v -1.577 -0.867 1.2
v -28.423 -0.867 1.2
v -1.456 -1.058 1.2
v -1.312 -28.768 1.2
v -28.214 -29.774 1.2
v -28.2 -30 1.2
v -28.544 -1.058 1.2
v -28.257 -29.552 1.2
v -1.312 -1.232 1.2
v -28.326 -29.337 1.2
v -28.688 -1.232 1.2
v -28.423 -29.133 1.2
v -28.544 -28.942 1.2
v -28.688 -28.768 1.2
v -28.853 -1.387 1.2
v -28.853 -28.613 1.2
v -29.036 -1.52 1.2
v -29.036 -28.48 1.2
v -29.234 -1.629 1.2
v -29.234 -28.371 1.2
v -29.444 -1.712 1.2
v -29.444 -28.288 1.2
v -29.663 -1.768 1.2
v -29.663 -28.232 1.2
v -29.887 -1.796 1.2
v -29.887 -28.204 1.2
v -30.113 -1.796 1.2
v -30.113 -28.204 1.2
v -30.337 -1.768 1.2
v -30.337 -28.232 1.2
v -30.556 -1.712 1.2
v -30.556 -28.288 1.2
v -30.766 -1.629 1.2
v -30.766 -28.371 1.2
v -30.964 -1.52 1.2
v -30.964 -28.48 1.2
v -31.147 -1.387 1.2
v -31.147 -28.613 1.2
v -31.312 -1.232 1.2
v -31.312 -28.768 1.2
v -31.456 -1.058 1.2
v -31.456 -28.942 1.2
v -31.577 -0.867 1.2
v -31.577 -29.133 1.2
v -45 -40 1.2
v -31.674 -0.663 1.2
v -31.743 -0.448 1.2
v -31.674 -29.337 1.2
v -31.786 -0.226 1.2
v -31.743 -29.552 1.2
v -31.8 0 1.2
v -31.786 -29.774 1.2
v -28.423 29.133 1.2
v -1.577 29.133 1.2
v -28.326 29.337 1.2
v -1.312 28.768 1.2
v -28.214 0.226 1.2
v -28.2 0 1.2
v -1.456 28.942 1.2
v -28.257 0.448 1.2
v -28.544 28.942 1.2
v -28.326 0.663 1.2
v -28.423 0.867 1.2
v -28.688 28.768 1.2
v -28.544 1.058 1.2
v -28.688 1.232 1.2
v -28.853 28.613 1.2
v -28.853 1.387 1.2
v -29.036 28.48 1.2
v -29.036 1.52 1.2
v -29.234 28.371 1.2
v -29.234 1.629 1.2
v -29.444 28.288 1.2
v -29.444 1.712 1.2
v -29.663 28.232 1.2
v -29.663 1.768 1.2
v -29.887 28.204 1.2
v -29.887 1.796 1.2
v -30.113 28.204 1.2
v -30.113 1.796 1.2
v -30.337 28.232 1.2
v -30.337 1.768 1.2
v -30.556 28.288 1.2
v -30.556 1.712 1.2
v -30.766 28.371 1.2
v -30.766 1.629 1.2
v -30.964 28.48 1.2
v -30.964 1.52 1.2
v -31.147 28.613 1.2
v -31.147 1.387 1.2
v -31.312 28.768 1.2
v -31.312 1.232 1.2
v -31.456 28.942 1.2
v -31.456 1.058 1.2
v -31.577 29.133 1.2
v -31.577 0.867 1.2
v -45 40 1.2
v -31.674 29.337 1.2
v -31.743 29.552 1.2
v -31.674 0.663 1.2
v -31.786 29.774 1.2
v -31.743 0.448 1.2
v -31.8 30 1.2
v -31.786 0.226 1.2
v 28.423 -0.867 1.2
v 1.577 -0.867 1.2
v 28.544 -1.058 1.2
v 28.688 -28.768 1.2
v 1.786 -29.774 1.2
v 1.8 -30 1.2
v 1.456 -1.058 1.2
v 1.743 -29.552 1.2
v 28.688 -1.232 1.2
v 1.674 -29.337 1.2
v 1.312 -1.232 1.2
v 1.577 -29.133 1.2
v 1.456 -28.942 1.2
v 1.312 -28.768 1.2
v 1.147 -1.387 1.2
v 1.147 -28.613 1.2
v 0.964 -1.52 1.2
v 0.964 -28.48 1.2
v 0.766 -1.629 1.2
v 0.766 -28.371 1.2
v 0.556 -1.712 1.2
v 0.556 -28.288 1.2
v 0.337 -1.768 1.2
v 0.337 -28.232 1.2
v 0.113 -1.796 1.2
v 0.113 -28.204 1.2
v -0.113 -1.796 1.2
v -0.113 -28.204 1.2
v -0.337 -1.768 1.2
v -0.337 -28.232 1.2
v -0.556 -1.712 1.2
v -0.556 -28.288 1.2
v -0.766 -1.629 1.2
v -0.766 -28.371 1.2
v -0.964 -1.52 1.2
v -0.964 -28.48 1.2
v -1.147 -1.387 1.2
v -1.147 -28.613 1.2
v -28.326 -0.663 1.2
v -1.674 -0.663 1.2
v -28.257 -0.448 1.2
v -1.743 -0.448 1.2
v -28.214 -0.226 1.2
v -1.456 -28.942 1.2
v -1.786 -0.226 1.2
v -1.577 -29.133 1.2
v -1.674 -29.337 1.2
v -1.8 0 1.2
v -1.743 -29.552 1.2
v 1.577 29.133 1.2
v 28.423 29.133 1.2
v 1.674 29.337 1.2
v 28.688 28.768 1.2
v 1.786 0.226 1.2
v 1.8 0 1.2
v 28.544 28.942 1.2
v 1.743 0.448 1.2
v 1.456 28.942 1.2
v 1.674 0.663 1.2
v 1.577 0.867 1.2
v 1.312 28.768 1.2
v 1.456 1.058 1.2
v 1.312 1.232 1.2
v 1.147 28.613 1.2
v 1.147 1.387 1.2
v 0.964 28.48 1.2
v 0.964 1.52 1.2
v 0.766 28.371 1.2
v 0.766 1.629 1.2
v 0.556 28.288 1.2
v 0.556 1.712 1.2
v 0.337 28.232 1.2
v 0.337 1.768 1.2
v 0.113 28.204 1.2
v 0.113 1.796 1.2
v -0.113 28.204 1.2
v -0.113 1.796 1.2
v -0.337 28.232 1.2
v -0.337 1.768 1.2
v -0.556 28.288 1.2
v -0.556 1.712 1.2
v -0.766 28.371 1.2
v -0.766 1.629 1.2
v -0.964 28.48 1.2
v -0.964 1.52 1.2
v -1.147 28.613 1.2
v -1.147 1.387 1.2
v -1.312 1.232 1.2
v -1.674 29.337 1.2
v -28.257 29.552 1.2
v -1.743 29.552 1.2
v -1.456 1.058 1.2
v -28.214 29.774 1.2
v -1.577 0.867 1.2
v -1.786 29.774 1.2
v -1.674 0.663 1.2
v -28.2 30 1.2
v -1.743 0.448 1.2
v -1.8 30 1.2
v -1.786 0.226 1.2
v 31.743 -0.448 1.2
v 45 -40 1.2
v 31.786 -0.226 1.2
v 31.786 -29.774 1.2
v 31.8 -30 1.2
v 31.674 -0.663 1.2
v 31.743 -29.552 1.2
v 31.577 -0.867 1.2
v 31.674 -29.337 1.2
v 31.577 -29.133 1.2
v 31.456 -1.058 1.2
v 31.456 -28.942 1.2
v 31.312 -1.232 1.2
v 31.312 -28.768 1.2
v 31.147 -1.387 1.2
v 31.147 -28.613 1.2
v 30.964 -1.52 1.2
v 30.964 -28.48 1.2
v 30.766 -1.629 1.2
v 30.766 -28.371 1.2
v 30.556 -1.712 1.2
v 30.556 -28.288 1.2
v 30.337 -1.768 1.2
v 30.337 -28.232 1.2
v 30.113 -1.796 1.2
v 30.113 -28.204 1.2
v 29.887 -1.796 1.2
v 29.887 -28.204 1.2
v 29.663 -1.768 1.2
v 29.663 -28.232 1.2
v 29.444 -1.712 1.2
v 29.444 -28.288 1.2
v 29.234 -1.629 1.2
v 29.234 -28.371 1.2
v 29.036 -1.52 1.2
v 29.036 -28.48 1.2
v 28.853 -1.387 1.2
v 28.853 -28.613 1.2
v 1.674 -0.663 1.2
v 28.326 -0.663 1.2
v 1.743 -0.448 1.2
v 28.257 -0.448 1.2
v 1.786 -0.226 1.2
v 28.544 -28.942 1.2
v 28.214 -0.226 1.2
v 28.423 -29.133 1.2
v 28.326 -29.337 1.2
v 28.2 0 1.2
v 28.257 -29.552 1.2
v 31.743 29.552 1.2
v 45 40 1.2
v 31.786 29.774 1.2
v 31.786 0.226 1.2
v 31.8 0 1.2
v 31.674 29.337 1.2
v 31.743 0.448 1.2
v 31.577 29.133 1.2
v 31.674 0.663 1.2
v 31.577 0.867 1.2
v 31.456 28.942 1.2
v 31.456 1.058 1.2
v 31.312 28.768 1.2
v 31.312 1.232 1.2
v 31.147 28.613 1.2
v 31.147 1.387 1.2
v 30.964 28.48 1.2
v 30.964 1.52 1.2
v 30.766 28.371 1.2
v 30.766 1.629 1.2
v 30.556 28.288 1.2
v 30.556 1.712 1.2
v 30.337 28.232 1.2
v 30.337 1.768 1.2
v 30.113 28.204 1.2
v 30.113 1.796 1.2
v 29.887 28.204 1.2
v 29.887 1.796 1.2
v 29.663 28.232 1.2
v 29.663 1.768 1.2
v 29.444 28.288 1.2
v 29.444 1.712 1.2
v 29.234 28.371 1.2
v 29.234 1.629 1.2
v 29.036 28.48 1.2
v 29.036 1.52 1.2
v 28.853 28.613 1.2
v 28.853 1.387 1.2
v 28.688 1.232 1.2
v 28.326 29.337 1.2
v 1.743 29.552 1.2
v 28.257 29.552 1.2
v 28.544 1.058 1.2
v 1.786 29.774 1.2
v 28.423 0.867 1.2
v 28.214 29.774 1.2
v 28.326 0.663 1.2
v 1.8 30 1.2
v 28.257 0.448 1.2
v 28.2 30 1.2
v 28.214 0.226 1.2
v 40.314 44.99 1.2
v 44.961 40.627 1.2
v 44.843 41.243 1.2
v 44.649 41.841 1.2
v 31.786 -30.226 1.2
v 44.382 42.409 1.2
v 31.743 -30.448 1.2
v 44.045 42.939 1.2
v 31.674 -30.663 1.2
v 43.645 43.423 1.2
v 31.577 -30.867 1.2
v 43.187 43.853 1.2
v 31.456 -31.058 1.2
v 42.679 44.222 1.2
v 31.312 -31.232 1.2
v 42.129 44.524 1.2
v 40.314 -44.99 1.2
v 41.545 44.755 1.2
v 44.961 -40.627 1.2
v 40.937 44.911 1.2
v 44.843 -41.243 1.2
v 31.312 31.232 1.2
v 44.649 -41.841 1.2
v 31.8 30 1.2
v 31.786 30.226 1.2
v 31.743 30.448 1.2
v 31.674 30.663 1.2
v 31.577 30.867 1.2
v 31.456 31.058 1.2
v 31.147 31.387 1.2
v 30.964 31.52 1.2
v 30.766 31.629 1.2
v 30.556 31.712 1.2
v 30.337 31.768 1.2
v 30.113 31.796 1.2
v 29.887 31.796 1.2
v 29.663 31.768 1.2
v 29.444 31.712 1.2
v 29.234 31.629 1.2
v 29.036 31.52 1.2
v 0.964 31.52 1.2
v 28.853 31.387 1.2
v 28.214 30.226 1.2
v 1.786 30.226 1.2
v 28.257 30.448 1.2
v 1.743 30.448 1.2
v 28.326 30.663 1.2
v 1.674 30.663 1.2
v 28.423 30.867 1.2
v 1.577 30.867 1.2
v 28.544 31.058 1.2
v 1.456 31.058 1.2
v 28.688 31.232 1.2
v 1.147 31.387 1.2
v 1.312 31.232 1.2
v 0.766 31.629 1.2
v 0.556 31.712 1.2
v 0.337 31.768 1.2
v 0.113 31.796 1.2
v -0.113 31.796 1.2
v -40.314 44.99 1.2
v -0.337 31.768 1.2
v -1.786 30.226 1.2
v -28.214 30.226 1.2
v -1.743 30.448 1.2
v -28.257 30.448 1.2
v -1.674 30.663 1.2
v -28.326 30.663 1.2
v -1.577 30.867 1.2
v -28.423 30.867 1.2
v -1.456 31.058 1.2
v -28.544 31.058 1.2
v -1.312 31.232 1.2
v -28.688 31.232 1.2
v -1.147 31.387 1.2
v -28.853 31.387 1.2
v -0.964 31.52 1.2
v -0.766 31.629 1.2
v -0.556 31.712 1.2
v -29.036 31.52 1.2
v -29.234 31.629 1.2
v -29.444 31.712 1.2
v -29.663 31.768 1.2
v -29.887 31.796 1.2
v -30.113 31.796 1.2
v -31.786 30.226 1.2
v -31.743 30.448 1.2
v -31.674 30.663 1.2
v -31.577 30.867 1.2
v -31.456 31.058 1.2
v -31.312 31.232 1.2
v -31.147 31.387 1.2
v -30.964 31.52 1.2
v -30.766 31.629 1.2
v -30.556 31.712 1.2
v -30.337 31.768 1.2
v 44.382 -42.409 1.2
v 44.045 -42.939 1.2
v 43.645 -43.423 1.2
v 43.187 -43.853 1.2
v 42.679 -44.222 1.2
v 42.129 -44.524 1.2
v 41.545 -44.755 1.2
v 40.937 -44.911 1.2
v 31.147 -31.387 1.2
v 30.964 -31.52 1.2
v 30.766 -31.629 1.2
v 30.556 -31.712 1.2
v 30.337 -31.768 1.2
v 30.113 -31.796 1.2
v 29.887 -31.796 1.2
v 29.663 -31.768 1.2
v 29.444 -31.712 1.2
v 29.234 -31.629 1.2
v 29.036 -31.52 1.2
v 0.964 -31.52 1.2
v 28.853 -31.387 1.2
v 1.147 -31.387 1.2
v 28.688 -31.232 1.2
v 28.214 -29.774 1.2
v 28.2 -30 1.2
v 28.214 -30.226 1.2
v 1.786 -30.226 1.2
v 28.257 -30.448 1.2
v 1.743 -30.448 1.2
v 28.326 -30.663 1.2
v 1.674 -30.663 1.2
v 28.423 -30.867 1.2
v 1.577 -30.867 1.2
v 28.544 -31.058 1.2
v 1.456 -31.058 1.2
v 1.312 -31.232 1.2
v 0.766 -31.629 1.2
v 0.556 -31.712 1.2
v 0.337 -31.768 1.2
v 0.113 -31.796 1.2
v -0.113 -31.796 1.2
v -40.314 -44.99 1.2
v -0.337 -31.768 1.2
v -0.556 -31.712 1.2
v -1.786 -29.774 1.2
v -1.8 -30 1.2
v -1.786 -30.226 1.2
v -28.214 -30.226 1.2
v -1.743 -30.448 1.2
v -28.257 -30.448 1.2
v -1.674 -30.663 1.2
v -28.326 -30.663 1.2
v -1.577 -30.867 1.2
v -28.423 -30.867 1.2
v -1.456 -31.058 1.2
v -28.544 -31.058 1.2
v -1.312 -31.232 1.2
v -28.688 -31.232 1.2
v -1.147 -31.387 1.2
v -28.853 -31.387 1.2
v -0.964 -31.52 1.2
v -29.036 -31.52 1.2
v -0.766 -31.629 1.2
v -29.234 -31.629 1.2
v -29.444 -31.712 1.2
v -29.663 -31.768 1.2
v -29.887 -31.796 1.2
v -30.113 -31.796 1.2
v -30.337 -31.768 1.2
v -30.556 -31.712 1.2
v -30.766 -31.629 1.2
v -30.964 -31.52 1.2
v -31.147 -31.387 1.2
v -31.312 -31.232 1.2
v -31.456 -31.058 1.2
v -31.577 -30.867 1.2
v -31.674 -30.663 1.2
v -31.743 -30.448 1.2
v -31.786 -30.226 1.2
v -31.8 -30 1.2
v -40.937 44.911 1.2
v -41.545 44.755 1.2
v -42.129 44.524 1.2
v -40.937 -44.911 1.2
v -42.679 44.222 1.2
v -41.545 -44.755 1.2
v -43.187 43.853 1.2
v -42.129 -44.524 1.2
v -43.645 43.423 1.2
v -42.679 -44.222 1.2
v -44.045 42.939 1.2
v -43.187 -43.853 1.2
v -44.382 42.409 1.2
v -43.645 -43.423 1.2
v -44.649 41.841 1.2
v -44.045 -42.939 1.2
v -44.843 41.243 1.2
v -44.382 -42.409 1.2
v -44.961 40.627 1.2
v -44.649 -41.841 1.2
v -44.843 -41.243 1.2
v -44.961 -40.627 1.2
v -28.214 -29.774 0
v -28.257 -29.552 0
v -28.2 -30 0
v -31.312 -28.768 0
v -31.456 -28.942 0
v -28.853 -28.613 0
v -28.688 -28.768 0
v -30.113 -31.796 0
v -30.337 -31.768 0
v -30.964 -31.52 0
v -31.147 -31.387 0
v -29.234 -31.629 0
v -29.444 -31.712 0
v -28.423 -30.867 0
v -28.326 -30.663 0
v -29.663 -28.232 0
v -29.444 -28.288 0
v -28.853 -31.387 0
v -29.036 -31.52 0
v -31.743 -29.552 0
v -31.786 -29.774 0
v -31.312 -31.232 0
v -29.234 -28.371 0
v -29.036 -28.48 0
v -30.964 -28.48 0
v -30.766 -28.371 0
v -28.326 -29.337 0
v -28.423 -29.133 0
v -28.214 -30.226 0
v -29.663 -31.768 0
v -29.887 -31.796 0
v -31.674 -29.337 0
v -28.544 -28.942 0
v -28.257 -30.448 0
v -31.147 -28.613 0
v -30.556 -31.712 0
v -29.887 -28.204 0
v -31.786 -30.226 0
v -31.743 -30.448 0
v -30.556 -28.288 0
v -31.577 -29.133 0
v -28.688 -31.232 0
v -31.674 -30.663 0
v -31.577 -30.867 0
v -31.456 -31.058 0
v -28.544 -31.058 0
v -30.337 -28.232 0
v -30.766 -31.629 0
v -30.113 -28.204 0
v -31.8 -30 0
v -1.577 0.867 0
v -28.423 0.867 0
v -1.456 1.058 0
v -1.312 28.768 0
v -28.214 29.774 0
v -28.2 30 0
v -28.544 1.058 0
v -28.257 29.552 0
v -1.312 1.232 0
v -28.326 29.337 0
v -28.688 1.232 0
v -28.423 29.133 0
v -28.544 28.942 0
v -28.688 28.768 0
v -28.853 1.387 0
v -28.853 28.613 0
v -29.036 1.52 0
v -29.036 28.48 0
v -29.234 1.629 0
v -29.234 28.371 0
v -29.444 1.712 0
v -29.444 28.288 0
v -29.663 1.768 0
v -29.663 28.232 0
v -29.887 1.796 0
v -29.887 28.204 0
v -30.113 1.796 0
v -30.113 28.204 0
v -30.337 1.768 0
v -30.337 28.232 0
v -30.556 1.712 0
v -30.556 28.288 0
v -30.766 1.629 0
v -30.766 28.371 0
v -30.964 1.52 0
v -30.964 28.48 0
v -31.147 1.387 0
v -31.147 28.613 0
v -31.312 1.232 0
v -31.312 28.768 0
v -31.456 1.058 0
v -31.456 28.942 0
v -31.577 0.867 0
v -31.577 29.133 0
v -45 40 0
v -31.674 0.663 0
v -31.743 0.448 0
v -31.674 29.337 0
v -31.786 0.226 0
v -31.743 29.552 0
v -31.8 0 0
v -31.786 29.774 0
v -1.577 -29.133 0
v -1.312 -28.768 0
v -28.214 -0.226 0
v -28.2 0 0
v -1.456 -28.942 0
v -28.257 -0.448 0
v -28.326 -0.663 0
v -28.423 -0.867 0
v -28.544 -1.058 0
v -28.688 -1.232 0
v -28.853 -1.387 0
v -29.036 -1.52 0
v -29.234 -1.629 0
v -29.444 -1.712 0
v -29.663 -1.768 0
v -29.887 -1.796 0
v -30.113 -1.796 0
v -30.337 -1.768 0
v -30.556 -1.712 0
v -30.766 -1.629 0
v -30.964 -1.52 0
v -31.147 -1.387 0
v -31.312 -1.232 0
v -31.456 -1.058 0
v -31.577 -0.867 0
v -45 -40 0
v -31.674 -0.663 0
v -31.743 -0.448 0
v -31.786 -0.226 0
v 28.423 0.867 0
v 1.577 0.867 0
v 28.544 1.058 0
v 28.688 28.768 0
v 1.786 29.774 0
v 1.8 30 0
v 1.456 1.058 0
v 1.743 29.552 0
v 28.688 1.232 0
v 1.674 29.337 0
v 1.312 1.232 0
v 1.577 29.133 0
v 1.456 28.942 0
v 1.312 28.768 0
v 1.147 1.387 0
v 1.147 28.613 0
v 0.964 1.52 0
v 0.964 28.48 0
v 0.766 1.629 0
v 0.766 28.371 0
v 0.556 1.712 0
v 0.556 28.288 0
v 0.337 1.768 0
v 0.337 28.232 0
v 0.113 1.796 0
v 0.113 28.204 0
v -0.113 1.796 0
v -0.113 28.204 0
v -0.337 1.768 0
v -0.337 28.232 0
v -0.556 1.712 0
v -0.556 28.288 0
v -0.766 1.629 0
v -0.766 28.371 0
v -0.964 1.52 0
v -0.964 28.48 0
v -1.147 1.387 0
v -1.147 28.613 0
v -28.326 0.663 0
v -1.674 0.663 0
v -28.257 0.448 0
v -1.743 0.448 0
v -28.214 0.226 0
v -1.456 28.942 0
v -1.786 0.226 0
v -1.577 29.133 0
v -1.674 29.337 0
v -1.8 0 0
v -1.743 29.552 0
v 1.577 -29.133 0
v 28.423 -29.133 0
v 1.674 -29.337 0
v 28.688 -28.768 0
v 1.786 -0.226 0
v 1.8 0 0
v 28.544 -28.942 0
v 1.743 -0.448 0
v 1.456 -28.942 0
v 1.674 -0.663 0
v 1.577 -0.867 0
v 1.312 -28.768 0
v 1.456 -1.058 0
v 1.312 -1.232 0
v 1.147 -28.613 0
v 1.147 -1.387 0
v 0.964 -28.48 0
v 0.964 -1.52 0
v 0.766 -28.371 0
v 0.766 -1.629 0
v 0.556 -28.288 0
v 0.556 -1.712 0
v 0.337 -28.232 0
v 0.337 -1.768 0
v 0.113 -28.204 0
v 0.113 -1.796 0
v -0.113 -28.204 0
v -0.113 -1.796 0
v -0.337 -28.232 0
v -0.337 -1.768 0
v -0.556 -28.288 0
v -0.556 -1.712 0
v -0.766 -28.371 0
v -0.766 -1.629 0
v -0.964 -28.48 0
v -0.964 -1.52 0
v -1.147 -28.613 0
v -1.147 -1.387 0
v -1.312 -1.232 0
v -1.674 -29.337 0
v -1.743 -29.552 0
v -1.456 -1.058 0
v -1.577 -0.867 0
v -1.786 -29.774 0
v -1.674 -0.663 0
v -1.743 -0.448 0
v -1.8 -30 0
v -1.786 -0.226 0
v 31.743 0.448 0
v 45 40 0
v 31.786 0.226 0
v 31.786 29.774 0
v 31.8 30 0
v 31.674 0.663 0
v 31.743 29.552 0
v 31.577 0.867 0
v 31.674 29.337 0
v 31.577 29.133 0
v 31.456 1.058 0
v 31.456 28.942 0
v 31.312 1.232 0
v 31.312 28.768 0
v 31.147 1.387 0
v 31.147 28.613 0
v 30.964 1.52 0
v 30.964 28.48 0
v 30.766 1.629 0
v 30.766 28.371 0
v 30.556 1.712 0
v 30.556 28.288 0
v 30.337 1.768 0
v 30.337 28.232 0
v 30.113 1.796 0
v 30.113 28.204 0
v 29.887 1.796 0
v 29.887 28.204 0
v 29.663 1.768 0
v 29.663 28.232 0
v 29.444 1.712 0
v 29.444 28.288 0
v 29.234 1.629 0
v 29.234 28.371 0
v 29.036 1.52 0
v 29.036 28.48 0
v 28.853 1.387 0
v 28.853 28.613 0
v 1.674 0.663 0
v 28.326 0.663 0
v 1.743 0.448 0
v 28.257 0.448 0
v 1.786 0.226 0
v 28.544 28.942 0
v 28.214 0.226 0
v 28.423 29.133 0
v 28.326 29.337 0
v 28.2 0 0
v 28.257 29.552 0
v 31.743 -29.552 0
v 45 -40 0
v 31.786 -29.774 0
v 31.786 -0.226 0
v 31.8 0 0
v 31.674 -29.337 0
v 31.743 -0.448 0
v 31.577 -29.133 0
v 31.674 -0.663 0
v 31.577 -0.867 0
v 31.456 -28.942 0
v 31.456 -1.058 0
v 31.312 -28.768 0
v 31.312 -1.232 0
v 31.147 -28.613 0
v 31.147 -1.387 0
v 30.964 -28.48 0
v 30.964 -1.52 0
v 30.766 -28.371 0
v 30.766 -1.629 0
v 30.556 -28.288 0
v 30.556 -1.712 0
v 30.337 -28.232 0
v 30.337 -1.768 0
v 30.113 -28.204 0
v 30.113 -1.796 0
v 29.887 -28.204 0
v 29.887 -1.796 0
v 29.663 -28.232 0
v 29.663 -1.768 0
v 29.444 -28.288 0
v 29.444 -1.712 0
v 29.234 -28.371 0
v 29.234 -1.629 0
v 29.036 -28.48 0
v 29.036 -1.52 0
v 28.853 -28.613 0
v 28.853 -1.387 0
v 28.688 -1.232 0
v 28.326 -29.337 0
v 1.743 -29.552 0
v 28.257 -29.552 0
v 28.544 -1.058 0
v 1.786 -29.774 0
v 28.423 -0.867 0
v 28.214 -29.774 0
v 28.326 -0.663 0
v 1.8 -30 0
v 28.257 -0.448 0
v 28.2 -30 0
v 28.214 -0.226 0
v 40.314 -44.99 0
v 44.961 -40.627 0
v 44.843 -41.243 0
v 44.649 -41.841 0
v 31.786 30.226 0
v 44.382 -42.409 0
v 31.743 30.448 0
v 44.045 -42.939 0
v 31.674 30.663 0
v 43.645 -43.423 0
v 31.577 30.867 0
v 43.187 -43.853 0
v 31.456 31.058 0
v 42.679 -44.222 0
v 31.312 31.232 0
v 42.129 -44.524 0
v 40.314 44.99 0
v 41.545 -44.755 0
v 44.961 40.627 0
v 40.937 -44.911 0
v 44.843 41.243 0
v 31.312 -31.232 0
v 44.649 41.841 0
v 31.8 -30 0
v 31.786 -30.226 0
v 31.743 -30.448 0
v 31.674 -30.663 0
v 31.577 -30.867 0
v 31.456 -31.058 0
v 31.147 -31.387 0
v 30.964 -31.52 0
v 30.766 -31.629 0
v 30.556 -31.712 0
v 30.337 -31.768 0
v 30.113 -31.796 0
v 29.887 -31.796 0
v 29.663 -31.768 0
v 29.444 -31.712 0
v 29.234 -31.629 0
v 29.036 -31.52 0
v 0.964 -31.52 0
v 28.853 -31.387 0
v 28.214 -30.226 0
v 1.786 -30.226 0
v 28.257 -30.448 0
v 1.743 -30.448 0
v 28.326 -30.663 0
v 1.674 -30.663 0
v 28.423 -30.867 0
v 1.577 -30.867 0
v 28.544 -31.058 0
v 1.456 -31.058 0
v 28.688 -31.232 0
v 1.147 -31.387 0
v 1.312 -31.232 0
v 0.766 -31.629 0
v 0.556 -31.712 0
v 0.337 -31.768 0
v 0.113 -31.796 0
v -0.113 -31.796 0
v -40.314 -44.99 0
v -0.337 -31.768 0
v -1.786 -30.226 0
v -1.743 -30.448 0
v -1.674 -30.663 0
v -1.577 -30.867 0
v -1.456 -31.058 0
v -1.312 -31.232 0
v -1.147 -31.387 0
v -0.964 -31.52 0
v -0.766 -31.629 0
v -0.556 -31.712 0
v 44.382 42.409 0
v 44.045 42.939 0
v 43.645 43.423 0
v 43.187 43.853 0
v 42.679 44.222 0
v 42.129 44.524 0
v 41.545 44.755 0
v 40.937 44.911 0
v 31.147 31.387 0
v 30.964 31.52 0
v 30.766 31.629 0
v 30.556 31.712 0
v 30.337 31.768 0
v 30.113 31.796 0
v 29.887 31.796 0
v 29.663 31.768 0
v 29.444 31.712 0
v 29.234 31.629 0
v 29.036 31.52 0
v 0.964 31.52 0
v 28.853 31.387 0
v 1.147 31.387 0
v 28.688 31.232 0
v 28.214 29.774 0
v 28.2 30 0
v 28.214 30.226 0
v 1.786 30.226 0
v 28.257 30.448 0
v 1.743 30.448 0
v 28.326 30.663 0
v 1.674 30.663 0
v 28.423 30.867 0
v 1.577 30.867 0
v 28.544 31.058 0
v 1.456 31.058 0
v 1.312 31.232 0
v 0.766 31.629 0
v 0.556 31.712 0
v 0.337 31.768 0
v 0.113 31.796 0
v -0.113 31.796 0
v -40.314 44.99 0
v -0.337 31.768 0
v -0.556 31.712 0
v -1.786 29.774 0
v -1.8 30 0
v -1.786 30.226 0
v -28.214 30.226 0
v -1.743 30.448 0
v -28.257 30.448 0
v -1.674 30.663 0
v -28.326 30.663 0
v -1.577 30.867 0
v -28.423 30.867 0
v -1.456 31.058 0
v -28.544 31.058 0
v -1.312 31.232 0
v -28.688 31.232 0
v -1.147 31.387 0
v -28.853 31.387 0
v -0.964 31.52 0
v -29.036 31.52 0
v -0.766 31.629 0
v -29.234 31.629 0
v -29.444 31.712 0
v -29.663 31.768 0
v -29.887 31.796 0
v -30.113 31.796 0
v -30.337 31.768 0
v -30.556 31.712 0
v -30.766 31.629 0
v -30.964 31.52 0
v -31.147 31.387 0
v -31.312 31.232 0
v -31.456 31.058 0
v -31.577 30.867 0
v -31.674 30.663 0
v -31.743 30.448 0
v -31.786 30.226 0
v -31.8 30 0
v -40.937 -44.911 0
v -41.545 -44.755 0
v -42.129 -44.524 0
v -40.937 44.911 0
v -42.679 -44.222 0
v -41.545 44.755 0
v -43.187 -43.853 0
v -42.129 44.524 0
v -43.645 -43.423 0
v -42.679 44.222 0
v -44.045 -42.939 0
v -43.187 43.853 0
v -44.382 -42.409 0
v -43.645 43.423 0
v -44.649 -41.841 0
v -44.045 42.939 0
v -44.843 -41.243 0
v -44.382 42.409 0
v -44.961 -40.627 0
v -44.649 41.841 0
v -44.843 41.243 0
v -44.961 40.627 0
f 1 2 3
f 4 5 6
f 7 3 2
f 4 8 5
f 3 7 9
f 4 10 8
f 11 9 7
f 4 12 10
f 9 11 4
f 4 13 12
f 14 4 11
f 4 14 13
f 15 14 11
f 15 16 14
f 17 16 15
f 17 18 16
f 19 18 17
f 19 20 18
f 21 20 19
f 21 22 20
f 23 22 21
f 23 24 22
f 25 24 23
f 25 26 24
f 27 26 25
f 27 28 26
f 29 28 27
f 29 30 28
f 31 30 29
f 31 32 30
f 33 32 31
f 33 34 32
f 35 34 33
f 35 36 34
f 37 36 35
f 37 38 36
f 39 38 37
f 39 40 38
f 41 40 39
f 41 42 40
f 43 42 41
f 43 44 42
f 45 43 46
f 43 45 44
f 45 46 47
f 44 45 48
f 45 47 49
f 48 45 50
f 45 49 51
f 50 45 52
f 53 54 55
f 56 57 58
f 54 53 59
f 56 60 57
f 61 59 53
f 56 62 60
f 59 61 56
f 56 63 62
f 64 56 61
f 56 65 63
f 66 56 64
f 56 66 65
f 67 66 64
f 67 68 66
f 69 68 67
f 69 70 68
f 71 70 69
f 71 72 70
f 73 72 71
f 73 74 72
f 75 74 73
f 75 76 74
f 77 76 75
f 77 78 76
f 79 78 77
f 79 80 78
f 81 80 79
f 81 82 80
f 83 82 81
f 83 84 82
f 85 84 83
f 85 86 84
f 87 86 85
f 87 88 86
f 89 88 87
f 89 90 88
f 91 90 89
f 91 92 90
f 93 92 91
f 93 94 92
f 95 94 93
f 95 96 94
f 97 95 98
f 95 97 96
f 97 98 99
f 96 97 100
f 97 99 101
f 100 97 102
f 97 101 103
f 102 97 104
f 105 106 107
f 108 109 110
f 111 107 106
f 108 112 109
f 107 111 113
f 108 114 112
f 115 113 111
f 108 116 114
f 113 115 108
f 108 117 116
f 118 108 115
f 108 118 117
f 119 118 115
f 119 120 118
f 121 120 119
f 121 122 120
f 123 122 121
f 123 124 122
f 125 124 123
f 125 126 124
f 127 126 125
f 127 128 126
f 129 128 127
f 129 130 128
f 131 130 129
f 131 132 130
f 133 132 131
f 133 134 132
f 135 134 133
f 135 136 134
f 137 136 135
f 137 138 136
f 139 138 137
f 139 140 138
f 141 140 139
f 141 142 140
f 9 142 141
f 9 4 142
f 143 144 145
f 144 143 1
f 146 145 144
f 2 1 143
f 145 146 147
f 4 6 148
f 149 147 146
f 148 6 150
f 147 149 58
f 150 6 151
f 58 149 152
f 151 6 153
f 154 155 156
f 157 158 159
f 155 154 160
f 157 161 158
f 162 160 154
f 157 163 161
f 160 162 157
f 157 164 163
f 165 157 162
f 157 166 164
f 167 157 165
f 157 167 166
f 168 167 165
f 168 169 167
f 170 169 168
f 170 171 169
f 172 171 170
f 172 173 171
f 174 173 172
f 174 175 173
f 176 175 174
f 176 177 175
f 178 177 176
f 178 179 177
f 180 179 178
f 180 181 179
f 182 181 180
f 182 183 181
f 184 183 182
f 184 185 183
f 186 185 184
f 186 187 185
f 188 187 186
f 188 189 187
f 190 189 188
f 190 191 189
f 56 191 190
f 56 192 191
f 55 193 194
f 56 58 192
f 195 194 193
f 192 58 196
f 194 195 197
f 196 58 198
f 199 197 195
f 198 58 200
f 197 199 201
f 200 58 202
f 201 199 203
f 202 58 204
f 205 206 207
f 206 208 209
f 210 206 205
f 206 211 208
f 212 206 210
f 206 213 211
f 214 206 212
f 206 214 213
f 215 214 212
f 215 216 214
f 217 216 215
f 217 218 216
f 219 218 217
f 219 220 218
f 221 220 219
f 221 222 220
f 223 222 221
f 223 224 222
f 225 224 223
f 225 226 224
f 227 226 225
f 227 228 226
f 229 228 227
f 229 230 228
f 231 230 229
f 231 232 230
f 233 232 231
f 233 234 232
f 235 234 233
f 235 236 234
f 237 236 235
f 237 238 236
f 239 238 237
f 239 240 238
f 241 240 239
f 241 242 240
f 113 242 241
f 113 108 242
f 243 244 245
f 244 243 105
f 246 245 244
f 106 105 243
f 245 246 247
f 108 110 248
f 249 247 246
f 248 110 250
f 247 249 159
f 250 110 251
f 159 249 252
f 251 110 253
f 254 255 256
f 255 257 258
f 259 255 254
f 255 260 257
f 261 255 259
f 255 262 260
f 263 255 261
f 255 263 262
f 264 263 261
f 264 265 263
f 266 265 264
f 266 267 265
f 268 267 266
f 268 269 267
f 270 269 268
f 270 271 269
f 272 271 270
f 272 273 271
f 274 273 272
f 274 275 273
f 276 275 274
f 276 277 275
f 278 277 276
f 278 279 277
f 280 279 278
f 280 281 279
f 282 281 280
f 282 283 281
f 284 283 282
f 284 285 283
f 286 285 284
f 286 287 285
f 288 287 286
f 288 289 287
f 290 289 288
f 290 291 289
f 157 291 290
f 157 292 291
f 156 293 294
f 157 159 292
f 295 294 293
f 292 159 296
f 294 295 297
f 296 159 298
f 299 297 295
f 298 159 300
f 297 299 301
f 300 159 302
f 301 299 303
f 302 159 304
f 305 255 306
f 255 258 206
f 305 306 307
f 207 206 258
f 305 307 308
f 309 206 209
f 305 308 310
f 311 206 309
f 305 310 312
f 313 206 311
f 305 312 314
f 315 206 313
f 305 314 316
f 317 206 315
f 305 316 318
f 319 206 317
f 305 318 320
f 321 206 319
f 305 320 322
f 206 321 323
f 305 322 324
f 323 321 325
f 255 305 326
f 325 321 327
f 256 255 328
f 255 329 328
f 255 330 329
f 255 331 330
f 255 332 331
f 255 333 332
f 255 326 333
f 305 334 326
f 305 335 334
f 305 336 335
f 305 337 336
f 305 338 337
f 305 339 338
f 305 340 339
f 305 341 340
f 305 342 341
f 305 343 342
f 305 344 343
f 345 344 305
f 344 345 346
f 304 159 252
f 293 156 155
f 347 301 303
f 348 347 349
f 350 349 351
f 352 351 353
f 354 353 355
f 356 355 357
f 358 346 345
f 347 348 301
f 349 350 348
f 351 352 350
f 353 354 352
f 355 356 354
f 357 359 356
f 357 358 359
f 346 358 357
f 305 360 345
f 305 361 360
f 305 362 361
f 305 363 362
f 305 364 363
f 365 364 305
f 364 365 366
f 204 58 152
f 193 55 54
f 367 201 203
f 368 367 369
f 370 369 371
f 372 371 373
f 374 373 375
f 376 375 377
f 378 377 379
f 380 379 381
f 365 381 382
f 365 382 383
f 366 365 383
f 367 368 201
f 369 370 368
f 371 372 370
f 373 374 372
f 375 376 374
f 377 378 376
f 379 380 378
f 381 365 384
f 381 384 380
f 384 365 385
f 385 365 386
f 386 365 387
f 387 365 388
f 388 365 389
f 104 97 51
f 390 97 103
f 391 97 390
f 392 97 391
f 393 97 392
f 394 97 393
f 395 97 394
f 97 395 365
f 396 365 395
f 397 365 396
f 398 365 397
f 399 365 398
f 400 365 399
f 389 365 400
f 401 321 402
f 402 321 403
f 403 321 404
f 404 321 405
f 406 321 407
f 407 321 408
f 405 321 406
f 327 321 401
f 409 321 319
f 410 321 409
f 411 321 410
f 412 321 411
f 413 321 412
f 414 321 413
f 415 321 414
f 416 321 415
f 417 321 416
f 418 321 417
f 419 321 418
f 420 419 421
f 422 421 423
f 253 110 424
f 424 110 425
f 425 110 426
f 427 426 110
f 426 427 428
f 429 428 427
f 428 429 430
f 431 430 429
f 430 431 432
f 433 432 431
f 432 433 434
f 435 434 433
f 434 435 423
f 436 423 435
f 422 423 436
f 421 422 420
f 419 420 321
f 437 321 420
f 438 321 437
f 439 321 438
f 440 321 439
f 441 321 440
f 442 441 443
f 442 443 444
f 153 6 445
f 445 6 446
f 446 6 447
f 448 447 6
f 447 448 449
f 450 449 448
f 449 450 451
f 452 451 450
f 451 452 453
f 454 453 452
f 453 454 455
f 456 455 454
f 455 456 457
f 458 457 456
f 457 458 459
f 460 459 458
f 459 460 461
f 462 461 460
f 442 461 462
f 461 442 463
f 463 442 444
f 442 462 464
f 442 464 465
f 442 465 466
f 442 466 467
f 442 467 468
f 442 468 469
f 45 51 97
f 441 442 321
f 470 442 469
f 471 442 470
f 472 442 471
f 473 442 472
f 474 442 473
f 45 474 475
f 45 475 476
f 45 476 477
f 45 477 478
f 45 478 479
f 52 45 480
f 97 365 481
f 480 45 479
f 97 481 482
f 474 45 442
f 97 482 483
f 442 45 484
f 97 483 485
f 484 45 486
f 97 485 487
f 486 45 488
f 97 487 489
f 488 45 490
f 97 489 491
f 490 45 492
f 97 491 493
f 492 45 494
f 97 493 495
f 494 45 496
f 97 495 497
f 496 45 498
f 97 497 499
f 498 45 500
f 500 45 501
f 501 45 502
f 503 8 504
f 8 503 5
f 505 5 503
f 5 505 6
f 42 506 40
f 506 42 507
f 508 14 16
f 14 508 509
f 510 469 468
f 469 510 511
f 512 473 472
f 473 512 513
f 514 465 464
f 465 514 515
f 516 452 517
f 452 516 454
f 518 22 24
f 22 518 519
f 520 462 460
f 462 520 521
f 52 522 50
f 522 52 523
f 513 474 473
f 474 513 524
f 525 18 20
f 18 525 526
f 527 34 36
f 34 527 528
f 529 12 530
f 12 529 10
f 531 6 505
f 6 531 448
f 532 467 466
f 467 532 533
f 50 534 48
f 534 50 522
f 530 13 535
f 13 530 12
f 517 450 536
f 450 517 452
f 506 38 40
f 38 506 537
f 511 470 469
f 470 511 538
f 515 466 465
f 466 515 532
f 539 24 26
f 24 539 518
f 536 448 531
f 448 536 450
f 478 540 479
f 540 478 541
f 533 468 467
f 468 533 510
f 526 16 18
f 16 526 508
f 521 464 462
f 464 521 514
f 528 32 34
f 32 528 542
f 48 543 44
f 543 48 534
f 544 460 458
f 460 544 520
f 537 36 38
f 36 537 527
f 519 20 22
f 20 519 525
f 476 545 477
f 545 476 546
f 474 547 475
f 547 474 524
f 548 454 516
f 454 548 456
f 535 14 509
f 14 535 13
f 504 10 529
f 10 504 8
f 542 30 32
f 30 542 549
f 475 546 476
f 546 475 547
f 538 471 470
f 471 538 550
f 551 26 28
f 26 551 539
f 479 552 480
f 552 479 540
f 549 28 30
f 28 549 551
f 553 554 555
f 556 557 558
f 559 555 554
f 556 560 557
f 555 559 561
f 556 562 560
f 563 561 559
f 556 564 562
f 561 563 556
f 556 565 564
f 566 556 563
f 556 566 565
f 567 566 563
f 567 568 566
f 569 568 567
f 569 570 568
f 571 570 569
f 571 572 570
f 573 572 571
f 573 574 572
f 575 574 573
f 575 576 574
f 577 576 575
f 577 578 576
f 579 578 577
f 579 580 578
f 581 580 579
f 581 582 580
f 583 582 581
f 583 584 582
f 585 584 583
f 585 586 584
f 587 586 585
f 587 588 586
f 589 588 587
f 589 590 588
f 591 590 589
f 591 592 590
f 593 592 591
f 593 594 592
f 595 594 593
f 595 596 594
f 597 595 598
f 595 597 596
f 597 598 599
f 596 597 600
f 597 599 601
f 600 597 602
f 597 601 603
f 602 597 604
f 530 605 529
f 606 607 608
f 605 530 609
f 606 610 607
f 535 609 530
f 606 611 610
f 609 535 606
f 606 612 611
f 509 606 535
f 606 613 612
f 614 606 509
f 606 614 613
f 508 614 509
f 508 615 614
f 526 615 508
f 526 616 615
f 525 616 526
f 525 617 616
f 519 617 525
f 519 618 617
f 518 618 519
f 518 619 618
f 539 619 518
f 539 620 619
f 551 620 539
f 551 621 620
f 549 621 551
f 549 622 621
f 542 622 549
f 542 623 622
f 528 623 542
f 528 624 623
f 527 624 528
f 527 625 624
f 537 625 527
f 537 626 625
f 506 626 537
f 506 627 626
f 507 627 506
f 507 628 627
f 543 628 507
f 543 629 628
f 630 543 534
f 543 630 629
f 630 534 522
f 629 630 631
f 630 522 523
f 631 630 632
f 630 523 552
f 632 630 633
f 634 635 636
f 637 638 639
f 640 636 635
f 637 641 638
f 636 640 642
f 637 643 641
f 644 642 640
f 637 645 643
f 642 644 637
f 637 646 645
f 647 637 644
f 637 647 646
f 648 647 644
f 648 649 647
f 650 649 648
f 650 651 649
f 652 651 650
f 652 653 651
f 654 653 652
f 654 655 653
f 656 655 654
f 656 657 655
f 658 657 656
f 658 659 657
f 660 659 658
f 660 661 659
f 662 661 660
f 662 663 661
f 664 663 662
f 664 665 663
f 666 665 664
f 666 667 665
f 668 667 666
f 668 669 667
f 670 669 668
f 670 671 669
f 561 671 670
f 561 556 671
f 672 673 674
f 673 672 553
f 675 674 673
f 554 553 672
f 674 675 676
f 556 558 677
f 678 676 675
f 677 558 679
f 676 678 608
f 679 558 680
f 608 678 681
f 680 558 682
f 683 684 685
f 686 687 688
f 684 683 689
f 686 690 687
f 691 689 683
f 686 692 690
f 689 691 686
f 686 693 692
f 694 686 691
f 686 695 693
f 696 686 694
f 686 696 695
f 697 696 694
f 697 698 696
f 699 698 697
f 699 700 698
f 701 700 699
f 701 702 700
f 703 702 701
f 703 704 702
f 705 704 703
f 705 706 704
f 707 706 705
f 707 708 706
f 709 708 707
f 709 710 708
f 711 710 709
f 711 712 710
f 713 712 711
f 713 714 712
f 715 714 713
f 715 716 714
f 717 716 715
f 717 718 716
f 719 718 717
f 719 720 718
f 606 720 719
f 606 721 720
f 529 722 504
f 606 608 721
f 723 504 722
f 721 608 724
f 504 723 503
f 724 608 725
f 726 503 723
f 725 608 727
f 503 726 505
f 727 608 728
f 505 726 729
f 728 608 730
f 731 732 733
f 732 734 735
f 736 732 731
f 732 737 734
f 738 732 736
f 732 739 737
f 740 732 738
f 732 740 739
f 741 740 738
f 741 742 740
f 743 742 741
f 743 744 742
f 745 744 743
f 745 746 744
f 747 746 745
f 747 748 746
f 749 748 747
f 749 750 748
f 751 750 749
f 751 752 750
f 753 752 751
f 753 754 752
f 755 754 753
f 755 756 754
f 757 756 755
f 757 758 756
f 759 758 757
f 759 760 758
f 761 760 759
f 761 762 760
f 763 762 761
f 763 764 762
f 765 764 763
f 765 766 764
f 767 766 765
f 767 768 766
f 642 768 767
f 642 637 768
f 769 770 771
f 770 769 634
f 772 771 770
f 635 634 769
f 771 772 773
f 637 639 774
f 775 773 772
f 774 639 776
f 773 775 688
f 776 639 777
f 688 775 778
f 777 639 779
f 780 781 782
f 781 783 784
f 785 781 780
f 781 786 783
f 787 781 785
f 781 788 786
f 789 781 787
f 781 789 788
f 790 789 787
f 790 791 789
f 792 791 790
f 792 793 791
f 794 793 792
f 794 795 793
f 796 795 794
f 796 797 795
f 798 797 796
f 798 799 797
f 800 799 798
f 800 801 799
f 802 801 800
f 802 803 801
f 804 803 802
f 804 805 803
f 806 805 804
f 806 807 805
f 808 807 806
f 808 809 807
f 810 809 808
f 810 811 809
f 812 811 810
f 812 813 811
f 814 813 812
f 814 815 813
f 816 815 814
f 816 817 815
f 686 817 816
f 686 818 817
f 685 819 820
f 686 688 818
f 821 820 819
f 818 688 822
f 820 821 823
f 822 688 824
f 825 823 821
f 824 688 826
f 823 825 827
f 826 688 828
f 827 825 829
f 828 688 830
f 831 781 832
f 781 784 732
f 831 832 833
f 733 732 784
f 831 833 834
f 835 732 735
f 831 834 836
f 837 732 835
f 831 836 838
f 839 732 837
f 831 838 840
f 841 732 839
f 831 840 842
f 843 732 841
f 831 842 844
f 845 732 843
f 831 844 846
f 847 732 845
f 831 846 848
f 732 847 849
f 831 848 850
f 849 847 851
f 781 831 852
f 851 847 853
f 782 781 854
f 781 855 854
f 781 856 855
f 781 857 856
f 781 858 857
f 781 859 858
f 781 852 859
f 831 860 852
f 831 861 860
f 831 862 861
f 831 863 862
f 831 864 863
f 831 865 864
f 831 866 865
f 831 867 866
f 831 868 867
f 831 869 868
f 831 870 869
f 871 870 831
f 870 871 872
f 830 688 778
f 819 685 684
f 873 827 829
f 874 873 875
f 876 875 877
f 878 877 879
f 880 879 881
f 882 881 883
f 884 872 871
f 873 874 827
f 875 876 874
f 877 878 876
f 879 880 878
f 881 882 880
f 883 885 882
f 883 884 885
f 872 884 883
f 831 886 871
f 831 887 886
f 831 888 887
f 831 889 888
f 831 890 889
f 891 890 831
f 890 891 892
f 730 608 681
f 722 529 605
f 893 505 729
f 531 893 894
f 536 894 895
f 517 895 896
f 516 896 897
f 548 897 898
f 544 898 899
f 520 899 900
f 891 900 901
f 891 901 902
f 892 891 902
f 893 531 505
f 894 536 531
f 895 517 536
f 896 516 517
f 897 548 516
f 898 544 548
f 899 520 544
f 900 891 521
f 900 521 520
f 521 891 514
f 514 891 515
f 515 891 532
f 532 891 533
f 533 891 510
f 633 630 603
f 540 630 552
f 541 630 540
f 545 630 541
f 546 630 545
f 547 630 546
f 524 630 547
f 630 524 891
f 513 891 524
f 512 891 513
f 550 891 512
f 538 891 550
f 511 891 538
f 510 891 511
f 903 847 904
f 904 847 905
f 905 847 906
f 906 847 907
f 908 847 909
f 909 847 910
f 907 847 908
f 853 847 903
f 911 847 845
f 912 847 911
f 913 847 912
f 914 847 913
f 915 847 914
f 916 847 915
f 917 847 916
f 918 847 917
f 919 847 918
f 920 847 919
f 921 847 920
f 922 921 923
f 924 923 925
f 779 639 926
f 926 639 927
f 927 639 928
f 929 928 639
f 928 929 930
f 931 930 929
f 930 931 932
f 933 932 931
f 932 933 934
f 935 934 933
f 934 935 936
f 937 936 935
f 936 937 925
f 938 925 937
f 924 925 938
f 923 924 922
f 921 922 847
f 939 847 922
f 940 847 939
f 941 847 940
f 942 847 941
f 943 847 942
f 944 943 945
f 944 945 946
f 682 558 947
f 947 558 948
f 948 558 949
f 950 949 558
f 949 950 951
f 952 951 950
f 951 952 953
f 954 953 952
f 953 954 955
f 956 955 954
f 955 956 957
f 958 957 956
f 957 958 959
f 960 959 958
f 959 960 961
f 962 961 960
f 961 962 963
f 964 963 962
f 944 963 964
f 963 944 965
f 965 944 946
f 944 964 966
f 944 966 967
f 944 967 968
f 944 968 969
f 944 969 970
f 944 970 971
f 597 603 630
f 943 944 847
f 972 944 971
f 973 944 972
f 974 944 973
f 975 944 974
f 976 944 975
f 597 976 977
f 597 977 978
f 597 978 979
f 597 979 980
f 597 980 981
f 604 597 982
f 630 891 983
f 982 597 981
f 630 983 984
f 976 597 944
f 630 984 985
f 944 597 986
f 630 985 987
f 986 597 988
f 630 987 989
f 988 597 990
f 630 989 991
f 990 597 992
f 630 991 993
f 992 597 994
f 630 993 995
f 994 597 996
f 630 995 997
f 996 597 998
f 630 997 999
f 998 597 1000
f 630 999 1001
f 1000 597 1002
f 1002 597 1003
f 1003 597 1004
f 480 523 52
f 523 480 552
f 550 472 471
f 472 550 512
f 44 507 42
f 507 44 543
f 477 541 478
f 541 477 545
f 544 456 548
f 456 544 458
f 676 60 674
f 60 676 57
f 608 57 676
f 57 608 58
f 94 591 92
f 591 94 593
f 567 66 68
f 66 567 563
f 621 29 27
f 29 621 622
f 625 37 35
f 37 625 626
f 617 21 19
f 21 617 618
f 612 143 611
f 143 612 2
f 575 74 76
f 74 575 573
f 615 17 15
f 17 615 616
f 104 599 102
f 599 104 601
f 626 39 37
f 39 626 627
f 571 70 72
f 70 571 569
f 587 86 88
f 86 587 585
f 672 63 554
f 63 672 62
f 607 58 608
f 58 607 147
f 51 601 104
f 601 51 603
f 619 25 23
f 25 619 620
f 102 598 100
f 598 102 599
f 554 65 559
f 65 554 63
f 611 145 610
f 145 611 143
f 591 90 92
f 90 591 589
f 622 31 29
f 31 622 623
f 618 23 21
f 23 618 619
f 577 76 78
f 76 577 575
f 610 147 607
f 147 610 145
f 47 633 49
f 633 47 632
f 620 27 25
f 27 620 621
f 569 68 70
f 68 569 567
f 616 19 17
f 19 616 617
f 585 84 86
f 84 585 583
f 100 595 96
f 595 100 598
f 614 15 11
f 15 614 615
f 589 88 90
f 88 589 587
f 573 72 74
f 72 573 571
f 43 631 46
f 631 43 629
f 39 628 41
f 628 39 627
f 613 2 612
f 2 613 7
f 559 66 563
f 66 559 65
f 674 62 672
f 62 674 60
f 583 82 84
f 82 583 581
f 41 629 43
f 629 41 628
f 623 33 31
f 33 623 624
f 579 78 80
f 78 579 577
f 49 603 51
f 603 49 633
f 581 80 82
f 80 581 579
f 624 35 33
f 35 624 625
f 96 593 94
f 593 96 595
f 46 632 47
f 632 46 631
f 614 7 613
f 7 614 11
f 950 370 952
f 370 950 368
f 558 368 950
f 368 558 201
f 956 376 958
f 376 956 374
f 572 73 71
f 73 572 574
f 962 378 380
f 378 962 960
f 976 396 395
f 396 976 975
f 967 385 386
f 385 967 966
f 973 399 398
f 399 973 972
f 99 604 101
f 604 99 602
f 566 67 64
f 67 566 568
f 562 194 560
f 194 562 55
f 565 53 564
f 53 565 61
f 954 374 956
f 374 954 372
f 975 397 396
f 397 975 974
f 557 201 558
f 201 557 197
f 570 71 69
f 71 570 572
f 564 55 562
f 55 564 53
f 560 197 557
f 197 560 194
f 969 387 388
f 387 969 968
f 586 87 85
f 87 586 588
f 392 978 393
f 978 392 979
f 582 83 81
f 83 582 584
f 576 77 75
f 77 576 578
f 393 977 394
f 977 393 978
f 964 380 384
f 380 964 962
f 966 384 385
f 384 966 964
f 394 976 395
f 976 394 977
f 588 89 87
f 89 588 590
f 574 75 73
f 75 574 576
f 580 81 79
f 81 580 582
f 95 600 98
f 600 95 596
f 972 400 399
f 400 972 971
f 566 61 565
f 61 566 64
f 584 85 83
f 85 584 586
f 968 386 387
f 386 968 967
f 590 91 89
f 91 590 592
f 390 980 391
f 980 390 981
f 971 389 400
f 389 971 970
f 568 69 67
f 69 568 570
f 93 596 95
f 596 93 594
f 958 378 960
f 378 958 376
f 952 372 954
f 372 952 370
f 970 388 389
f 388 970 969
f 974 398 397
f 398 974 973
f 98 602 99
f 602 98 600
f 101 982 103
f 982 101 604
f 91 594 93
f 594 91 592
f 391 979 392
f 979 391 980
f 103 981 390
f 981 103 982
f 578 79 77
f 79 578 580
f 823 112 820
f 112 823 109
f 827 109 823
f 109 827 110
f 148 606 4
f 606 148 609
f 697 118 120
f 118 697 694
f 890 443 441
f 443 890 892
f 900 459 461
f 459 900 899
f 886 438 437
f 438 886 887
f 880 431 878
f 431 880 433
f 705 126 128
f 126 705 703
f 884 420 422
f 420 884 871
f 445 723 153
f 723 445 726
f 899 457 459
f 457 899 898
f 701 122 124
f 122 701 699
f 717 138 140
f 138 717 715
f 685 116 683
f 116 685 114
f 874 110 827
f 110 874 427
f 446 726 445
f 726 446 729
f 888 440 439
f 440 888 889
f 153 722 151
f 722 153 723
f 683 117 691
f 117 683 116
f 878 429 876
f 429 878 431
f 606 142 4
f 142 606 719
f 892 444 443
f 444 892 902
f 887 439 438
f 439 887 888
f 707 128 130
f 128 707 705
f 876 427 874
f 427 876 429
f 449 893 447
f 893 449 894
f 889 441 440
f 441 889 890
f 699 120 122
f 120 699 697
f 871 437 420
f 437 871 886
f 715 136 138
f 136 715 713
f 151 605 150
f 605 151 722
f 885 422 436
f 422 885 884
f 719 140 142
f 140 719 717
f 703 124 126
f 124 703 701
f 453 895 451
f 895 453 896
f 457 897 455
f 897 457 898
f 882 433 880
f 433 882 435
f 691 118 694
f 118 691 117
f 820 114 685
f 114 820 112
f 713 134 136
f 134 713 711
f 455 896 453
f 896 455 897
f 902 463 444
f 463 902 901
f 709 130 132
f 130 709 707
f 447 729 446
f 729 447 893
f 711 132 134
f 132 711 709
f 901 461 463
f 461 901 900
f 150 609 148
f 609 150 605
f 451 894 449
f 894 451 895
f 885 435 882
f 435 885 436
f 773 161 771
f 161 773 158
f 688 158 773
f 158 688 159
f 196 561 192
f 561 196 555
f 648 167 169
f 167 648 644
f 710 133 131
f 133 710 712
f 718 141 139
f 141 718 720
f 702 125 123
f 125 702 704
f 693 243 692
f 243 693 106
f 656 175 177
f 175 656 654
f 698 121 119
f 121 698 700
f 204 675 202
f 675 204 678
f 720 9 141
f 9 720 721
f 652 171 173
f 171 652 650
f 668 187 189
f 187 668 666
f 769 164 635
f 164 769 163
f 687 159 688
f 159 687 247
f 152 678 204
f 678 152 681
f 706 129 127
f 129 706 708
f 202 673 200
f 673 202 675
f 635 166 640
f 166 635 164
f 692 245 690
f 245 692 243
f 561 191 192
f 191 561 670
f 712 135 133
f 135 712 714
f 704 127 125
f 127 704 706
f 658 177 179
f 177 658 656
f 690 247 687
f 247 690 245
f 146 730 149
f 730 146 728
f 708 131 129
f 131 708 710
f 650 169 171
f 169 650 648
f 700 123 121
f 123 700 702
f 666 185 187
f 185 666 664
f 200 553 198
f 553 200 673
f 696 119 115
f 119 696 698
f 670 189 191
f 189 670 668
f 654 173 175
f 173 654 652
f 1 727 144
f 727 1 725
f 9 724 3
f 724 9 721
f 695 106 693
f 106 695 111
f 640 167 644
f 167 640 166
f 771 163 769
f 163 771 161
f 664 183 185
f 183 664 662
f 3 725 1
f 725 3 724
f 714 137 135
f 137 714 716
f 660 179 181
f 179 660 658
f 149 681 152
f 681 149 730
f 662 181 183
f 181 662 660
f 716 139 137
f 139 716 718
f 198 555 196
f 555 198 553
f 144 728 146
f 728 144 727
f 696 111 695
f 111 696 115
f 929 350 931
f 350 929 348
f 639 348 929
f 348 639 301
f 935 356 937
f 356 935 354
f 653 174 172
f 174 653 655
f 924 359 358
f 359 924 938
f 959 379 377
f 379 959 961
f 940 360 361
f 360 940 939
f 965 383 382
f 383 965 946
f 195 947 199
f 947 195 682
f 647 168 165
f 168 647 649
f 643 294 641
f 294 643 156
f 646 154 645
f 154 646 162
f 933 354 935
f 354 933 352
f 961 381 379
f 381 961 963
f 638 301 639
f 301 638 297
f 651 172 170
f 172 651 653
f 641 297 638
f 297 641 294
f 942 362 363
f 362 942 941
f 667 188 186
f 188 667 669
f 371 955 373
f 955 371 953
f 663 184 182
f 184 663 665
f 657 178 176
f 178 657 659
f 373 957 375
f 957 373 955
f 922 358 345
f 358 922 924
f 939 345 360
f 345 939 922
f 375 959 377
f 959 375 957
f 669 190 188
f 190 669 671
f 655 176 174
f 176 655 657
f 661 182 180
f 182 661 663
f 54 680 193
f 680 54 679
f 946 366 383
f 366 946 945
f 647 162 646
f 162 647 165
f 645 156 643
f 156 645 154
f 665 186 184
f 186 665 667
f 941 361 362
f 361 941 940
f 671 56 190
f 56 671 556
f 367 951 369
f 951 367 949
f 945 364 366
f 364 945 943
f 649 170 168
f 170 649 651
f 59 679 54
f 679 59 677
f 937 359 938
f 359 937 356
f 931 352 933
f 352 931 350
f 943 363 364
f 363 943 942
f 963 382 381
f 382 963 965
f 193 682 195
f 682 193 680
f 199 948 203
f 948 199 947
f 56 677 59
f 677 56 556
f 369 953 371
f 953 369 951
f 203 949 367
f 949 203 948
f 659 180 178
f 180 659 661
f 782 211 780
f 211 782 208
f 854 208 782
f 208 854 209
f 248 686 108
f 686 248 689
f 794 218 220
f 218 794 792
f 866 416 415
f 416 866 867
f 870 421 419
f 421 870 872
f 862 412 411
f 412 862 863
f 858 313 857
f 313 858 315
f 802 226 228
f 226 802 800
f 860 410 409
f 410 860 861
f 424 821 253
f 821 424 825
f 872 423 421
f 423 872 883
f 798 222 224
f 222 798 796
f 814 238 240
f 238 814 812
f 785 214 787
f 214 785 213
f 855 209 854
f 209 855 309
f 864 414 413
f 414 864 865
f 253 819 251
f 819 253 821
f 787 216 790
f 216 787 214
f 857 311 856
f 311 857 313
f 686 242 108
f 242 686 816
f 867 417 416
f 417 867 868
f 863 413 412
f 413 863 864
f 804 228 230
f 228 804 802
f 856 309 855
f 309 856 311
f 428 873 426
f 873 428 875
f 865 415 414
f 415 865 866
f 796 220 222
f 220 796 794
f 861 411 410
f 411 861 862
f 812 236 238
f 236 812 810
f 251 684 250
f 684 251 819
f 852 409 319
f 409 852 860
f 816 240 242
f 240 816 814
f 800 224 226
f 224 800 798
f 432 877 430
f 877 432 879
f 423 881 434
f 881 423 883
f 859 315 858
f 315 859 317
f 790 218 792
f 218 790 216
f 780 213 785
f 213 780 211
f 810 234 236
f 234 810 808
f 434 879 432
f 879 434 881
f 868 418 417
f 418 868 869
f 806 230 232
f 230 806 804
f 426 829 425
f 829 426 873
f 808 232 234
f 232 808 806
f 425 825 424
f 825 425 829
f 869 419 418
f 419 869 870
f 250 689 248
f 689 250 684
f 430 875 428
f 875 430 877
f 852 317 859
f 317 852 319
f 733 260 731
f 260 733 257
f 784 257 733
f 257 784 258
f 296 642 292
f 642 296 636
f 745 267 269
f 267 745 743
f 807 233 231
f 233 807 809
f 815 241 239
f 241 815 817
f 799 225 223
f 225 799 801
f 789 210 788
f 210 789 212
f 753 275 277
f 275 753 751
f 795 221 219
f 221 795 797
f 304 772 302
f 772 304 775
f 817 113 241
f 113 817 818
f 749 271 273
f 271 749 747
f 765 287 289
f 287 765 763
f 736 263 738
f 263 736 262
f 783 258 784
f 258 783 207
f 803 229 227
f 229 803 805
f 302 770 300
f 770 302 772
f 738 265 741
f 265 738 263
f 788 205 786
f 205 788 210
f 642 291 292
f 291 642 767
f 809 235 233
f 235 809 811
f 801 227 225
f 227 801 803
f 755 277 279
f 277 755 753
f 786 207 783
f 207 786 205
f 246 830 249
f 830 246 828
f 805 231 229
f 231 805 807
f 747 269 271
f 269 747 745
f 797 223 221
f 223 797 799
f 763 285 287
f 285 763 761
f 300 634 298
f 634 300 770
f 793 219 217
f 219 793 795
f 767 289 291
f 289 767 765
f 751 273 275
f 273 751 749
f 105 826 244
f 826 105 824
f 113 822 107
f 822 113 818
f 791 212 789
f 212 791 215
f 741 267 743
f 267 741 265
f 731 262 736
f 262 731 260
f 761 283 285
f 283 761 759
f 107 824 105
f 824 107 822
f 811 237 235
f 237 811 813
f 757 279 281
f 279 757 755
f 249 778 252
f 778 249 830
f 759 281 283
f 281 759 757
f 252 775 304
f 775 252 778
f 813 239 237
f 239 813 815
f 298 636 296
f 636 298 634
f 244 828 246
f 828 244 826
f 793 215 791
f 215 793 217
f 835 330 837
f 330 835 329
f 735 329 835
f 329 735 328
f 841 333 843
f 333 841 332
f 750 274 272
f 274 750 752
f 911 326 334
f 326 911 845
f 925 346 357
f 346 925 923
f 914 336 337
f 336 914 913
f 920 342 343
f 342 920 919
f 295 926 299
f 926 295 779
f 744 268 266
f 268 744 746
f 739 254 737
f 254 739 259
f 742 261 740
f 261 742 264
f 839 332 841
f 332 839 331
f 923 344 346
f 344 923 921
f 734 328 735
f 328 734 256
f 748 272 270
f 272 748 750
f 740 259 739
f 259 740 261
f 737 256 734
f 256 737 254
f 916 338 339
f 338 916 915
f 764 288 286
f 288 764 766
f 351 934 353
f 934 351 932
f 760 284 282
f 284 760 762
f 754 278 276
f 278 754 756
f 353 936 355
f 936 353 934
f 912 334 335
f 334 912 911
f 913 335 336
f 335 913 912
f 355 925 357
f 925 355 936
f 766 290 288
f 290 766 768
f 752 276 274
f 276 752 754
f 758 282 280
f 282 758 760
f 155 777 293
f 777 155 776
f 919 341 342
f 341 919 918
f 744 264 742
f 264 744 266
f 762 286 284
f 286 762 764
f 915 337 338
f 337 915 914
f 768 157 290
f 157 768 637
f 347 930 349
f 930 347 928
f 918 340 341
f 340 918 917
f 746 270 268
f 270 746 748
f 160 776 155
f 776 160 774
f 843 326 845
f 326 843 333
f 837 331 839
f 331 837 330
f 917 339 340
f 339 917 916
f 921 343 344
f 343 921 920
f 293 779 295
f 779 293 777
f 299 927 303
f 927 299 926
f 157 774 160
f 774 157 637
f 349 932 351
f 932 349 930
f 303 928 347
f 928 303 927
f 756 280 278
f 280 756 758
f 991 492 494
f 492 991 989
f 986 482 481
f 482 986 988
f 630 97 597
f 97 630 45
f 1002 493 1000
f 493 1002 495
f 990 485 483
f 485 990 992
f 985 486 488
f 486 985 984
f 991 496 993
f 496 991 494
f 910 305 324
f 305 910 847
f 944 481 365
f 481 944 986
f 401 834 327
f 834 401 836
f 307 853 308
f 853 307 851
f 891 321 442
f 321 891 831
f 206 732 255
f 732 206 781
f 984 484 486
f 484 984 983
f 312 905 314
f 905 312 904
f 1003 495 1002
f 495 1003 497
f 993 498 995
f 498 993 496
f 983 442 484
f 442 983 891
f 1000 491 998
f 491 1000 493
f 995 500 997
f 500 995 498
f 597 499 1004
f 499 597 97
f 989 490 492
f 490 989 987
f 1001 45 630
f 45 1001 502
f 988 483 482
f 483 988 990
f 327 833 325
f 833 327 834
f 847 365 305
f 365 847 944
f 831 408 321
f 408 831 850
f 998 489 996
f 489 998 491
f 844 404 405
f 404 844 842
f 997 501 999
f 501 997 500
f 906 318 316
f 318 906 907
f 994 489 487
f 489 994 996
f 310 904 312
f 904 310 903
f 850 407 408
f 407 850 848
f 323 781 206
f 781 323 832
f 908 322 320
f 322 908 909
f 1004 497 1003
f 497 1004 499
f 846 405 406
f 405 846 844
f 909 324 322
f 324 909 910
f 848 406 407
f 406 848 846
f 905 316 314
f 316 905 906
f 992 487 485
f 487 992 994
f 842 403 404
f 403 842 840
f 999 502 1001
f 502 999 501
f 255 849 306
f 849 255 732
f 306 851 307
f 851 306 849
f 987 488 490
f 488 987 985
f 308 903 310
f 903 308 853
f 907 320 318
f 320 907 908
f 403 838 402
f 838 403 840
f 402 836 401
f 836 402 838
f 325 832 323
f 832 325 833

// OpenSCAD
$fn = 50;


difference() {
	union() {
		hull() {
			translate(v = [-40.0000000000, 40.0000000000, 0]) {
				cylinder(h = 9, r = 5);
			}
			translate(v = [40.0000000000, 40.0000000000, 0]) {
				cylinder(h = 9, r = 5);
			}
			translate(v = [-40.0000000000, -40.0000000000, 0]) {
				cylinder(h = 9, r = 5);
			}
			translate(v = [40.0000000000, -40.0000000000, 0]) {
				cylinder(h = 9, r = 5);
			}
		}
	}
	union() {
		translate(v = [0, 0, 1.2000000000]) {
			hull() {
				translate(v = [-40.0000000000, 40.0000000000, 0]) {
					cylinder(h = 7.8000000000, r = 3.8000000000);
				}
				translate(v = [40.0000000000, 40.0000000000, 0]) {
					cylinder(h = 7.8000000000, r = 3.8000000000);
				}
				translate(v = [-40.0000000000, -40.0000000000, 0]) {
					cylinder(h = 7.8000000000, r = 3.8000000000);
				}
				translate(v = [40.0000000000, -40.0000000000, 0]) {
					cylinder(h = 7.8000000000, r = 3.8000000000);
				}
			}
		}
		#translate(v = [-30.0000000000, -30.0000000000, 0]) {
			cylinder(h = 1.2000000000, r = 1.8000000000);
		}
		#translate(v = [-30.0000000000, 0.0000000000, 0]) {
			cylinder(h = 1.2000000000, r = 1.8000000000);
		}
		#translate(v = [-30.0000000000, 30.0000000000, 0]) {
			cylinder(h = 1.2000000000, r = 1.8000000000);
		}
		#translate(v = [0.0000000000, -30.0000000000, 0]) {
			cylinder(h = 1.2000000000, r = 1.8000000000);
		}
		#cylinder(h = 1.2000000000, r = 1.8000000000);
		#translate(v = [0.0000000000, 30.0000000000, 0]) {
			cylinder(h = 1.2000000000, r = 1.8000000000);
		}
		#translate(v = [30.0000000000, -30.0000000000, 0]) {
			cylinder(h = 1.2000000000, r = 1.8000000000);
		}
		#translate(v = [30.0000000000, 0.0000000000, 0]) {
			cylinder(h = 1.2000000000, r = 1.8000000000);
		}
		#translate(v = [30.0000000000, 30.0000000000, 0]) {
			cylinder(h = 1.2000000000, r = 1.8000000000);
		}
		translate(v = [-250.0000000000, -250.0000000000, 1.2000000000]) {
			cube(size = [500, 500, 500]);
		}
		translate(v = [-250.0000000000, -250.0000000000, 1.2000000000]) {
			cube(size = [500, 500, 500]);
		}
		translate(v = [-250.0000000000, -250.0000000000, 1.2000000000]) {
			cube(size = [500, 500, 500]);
		}
	}
}
